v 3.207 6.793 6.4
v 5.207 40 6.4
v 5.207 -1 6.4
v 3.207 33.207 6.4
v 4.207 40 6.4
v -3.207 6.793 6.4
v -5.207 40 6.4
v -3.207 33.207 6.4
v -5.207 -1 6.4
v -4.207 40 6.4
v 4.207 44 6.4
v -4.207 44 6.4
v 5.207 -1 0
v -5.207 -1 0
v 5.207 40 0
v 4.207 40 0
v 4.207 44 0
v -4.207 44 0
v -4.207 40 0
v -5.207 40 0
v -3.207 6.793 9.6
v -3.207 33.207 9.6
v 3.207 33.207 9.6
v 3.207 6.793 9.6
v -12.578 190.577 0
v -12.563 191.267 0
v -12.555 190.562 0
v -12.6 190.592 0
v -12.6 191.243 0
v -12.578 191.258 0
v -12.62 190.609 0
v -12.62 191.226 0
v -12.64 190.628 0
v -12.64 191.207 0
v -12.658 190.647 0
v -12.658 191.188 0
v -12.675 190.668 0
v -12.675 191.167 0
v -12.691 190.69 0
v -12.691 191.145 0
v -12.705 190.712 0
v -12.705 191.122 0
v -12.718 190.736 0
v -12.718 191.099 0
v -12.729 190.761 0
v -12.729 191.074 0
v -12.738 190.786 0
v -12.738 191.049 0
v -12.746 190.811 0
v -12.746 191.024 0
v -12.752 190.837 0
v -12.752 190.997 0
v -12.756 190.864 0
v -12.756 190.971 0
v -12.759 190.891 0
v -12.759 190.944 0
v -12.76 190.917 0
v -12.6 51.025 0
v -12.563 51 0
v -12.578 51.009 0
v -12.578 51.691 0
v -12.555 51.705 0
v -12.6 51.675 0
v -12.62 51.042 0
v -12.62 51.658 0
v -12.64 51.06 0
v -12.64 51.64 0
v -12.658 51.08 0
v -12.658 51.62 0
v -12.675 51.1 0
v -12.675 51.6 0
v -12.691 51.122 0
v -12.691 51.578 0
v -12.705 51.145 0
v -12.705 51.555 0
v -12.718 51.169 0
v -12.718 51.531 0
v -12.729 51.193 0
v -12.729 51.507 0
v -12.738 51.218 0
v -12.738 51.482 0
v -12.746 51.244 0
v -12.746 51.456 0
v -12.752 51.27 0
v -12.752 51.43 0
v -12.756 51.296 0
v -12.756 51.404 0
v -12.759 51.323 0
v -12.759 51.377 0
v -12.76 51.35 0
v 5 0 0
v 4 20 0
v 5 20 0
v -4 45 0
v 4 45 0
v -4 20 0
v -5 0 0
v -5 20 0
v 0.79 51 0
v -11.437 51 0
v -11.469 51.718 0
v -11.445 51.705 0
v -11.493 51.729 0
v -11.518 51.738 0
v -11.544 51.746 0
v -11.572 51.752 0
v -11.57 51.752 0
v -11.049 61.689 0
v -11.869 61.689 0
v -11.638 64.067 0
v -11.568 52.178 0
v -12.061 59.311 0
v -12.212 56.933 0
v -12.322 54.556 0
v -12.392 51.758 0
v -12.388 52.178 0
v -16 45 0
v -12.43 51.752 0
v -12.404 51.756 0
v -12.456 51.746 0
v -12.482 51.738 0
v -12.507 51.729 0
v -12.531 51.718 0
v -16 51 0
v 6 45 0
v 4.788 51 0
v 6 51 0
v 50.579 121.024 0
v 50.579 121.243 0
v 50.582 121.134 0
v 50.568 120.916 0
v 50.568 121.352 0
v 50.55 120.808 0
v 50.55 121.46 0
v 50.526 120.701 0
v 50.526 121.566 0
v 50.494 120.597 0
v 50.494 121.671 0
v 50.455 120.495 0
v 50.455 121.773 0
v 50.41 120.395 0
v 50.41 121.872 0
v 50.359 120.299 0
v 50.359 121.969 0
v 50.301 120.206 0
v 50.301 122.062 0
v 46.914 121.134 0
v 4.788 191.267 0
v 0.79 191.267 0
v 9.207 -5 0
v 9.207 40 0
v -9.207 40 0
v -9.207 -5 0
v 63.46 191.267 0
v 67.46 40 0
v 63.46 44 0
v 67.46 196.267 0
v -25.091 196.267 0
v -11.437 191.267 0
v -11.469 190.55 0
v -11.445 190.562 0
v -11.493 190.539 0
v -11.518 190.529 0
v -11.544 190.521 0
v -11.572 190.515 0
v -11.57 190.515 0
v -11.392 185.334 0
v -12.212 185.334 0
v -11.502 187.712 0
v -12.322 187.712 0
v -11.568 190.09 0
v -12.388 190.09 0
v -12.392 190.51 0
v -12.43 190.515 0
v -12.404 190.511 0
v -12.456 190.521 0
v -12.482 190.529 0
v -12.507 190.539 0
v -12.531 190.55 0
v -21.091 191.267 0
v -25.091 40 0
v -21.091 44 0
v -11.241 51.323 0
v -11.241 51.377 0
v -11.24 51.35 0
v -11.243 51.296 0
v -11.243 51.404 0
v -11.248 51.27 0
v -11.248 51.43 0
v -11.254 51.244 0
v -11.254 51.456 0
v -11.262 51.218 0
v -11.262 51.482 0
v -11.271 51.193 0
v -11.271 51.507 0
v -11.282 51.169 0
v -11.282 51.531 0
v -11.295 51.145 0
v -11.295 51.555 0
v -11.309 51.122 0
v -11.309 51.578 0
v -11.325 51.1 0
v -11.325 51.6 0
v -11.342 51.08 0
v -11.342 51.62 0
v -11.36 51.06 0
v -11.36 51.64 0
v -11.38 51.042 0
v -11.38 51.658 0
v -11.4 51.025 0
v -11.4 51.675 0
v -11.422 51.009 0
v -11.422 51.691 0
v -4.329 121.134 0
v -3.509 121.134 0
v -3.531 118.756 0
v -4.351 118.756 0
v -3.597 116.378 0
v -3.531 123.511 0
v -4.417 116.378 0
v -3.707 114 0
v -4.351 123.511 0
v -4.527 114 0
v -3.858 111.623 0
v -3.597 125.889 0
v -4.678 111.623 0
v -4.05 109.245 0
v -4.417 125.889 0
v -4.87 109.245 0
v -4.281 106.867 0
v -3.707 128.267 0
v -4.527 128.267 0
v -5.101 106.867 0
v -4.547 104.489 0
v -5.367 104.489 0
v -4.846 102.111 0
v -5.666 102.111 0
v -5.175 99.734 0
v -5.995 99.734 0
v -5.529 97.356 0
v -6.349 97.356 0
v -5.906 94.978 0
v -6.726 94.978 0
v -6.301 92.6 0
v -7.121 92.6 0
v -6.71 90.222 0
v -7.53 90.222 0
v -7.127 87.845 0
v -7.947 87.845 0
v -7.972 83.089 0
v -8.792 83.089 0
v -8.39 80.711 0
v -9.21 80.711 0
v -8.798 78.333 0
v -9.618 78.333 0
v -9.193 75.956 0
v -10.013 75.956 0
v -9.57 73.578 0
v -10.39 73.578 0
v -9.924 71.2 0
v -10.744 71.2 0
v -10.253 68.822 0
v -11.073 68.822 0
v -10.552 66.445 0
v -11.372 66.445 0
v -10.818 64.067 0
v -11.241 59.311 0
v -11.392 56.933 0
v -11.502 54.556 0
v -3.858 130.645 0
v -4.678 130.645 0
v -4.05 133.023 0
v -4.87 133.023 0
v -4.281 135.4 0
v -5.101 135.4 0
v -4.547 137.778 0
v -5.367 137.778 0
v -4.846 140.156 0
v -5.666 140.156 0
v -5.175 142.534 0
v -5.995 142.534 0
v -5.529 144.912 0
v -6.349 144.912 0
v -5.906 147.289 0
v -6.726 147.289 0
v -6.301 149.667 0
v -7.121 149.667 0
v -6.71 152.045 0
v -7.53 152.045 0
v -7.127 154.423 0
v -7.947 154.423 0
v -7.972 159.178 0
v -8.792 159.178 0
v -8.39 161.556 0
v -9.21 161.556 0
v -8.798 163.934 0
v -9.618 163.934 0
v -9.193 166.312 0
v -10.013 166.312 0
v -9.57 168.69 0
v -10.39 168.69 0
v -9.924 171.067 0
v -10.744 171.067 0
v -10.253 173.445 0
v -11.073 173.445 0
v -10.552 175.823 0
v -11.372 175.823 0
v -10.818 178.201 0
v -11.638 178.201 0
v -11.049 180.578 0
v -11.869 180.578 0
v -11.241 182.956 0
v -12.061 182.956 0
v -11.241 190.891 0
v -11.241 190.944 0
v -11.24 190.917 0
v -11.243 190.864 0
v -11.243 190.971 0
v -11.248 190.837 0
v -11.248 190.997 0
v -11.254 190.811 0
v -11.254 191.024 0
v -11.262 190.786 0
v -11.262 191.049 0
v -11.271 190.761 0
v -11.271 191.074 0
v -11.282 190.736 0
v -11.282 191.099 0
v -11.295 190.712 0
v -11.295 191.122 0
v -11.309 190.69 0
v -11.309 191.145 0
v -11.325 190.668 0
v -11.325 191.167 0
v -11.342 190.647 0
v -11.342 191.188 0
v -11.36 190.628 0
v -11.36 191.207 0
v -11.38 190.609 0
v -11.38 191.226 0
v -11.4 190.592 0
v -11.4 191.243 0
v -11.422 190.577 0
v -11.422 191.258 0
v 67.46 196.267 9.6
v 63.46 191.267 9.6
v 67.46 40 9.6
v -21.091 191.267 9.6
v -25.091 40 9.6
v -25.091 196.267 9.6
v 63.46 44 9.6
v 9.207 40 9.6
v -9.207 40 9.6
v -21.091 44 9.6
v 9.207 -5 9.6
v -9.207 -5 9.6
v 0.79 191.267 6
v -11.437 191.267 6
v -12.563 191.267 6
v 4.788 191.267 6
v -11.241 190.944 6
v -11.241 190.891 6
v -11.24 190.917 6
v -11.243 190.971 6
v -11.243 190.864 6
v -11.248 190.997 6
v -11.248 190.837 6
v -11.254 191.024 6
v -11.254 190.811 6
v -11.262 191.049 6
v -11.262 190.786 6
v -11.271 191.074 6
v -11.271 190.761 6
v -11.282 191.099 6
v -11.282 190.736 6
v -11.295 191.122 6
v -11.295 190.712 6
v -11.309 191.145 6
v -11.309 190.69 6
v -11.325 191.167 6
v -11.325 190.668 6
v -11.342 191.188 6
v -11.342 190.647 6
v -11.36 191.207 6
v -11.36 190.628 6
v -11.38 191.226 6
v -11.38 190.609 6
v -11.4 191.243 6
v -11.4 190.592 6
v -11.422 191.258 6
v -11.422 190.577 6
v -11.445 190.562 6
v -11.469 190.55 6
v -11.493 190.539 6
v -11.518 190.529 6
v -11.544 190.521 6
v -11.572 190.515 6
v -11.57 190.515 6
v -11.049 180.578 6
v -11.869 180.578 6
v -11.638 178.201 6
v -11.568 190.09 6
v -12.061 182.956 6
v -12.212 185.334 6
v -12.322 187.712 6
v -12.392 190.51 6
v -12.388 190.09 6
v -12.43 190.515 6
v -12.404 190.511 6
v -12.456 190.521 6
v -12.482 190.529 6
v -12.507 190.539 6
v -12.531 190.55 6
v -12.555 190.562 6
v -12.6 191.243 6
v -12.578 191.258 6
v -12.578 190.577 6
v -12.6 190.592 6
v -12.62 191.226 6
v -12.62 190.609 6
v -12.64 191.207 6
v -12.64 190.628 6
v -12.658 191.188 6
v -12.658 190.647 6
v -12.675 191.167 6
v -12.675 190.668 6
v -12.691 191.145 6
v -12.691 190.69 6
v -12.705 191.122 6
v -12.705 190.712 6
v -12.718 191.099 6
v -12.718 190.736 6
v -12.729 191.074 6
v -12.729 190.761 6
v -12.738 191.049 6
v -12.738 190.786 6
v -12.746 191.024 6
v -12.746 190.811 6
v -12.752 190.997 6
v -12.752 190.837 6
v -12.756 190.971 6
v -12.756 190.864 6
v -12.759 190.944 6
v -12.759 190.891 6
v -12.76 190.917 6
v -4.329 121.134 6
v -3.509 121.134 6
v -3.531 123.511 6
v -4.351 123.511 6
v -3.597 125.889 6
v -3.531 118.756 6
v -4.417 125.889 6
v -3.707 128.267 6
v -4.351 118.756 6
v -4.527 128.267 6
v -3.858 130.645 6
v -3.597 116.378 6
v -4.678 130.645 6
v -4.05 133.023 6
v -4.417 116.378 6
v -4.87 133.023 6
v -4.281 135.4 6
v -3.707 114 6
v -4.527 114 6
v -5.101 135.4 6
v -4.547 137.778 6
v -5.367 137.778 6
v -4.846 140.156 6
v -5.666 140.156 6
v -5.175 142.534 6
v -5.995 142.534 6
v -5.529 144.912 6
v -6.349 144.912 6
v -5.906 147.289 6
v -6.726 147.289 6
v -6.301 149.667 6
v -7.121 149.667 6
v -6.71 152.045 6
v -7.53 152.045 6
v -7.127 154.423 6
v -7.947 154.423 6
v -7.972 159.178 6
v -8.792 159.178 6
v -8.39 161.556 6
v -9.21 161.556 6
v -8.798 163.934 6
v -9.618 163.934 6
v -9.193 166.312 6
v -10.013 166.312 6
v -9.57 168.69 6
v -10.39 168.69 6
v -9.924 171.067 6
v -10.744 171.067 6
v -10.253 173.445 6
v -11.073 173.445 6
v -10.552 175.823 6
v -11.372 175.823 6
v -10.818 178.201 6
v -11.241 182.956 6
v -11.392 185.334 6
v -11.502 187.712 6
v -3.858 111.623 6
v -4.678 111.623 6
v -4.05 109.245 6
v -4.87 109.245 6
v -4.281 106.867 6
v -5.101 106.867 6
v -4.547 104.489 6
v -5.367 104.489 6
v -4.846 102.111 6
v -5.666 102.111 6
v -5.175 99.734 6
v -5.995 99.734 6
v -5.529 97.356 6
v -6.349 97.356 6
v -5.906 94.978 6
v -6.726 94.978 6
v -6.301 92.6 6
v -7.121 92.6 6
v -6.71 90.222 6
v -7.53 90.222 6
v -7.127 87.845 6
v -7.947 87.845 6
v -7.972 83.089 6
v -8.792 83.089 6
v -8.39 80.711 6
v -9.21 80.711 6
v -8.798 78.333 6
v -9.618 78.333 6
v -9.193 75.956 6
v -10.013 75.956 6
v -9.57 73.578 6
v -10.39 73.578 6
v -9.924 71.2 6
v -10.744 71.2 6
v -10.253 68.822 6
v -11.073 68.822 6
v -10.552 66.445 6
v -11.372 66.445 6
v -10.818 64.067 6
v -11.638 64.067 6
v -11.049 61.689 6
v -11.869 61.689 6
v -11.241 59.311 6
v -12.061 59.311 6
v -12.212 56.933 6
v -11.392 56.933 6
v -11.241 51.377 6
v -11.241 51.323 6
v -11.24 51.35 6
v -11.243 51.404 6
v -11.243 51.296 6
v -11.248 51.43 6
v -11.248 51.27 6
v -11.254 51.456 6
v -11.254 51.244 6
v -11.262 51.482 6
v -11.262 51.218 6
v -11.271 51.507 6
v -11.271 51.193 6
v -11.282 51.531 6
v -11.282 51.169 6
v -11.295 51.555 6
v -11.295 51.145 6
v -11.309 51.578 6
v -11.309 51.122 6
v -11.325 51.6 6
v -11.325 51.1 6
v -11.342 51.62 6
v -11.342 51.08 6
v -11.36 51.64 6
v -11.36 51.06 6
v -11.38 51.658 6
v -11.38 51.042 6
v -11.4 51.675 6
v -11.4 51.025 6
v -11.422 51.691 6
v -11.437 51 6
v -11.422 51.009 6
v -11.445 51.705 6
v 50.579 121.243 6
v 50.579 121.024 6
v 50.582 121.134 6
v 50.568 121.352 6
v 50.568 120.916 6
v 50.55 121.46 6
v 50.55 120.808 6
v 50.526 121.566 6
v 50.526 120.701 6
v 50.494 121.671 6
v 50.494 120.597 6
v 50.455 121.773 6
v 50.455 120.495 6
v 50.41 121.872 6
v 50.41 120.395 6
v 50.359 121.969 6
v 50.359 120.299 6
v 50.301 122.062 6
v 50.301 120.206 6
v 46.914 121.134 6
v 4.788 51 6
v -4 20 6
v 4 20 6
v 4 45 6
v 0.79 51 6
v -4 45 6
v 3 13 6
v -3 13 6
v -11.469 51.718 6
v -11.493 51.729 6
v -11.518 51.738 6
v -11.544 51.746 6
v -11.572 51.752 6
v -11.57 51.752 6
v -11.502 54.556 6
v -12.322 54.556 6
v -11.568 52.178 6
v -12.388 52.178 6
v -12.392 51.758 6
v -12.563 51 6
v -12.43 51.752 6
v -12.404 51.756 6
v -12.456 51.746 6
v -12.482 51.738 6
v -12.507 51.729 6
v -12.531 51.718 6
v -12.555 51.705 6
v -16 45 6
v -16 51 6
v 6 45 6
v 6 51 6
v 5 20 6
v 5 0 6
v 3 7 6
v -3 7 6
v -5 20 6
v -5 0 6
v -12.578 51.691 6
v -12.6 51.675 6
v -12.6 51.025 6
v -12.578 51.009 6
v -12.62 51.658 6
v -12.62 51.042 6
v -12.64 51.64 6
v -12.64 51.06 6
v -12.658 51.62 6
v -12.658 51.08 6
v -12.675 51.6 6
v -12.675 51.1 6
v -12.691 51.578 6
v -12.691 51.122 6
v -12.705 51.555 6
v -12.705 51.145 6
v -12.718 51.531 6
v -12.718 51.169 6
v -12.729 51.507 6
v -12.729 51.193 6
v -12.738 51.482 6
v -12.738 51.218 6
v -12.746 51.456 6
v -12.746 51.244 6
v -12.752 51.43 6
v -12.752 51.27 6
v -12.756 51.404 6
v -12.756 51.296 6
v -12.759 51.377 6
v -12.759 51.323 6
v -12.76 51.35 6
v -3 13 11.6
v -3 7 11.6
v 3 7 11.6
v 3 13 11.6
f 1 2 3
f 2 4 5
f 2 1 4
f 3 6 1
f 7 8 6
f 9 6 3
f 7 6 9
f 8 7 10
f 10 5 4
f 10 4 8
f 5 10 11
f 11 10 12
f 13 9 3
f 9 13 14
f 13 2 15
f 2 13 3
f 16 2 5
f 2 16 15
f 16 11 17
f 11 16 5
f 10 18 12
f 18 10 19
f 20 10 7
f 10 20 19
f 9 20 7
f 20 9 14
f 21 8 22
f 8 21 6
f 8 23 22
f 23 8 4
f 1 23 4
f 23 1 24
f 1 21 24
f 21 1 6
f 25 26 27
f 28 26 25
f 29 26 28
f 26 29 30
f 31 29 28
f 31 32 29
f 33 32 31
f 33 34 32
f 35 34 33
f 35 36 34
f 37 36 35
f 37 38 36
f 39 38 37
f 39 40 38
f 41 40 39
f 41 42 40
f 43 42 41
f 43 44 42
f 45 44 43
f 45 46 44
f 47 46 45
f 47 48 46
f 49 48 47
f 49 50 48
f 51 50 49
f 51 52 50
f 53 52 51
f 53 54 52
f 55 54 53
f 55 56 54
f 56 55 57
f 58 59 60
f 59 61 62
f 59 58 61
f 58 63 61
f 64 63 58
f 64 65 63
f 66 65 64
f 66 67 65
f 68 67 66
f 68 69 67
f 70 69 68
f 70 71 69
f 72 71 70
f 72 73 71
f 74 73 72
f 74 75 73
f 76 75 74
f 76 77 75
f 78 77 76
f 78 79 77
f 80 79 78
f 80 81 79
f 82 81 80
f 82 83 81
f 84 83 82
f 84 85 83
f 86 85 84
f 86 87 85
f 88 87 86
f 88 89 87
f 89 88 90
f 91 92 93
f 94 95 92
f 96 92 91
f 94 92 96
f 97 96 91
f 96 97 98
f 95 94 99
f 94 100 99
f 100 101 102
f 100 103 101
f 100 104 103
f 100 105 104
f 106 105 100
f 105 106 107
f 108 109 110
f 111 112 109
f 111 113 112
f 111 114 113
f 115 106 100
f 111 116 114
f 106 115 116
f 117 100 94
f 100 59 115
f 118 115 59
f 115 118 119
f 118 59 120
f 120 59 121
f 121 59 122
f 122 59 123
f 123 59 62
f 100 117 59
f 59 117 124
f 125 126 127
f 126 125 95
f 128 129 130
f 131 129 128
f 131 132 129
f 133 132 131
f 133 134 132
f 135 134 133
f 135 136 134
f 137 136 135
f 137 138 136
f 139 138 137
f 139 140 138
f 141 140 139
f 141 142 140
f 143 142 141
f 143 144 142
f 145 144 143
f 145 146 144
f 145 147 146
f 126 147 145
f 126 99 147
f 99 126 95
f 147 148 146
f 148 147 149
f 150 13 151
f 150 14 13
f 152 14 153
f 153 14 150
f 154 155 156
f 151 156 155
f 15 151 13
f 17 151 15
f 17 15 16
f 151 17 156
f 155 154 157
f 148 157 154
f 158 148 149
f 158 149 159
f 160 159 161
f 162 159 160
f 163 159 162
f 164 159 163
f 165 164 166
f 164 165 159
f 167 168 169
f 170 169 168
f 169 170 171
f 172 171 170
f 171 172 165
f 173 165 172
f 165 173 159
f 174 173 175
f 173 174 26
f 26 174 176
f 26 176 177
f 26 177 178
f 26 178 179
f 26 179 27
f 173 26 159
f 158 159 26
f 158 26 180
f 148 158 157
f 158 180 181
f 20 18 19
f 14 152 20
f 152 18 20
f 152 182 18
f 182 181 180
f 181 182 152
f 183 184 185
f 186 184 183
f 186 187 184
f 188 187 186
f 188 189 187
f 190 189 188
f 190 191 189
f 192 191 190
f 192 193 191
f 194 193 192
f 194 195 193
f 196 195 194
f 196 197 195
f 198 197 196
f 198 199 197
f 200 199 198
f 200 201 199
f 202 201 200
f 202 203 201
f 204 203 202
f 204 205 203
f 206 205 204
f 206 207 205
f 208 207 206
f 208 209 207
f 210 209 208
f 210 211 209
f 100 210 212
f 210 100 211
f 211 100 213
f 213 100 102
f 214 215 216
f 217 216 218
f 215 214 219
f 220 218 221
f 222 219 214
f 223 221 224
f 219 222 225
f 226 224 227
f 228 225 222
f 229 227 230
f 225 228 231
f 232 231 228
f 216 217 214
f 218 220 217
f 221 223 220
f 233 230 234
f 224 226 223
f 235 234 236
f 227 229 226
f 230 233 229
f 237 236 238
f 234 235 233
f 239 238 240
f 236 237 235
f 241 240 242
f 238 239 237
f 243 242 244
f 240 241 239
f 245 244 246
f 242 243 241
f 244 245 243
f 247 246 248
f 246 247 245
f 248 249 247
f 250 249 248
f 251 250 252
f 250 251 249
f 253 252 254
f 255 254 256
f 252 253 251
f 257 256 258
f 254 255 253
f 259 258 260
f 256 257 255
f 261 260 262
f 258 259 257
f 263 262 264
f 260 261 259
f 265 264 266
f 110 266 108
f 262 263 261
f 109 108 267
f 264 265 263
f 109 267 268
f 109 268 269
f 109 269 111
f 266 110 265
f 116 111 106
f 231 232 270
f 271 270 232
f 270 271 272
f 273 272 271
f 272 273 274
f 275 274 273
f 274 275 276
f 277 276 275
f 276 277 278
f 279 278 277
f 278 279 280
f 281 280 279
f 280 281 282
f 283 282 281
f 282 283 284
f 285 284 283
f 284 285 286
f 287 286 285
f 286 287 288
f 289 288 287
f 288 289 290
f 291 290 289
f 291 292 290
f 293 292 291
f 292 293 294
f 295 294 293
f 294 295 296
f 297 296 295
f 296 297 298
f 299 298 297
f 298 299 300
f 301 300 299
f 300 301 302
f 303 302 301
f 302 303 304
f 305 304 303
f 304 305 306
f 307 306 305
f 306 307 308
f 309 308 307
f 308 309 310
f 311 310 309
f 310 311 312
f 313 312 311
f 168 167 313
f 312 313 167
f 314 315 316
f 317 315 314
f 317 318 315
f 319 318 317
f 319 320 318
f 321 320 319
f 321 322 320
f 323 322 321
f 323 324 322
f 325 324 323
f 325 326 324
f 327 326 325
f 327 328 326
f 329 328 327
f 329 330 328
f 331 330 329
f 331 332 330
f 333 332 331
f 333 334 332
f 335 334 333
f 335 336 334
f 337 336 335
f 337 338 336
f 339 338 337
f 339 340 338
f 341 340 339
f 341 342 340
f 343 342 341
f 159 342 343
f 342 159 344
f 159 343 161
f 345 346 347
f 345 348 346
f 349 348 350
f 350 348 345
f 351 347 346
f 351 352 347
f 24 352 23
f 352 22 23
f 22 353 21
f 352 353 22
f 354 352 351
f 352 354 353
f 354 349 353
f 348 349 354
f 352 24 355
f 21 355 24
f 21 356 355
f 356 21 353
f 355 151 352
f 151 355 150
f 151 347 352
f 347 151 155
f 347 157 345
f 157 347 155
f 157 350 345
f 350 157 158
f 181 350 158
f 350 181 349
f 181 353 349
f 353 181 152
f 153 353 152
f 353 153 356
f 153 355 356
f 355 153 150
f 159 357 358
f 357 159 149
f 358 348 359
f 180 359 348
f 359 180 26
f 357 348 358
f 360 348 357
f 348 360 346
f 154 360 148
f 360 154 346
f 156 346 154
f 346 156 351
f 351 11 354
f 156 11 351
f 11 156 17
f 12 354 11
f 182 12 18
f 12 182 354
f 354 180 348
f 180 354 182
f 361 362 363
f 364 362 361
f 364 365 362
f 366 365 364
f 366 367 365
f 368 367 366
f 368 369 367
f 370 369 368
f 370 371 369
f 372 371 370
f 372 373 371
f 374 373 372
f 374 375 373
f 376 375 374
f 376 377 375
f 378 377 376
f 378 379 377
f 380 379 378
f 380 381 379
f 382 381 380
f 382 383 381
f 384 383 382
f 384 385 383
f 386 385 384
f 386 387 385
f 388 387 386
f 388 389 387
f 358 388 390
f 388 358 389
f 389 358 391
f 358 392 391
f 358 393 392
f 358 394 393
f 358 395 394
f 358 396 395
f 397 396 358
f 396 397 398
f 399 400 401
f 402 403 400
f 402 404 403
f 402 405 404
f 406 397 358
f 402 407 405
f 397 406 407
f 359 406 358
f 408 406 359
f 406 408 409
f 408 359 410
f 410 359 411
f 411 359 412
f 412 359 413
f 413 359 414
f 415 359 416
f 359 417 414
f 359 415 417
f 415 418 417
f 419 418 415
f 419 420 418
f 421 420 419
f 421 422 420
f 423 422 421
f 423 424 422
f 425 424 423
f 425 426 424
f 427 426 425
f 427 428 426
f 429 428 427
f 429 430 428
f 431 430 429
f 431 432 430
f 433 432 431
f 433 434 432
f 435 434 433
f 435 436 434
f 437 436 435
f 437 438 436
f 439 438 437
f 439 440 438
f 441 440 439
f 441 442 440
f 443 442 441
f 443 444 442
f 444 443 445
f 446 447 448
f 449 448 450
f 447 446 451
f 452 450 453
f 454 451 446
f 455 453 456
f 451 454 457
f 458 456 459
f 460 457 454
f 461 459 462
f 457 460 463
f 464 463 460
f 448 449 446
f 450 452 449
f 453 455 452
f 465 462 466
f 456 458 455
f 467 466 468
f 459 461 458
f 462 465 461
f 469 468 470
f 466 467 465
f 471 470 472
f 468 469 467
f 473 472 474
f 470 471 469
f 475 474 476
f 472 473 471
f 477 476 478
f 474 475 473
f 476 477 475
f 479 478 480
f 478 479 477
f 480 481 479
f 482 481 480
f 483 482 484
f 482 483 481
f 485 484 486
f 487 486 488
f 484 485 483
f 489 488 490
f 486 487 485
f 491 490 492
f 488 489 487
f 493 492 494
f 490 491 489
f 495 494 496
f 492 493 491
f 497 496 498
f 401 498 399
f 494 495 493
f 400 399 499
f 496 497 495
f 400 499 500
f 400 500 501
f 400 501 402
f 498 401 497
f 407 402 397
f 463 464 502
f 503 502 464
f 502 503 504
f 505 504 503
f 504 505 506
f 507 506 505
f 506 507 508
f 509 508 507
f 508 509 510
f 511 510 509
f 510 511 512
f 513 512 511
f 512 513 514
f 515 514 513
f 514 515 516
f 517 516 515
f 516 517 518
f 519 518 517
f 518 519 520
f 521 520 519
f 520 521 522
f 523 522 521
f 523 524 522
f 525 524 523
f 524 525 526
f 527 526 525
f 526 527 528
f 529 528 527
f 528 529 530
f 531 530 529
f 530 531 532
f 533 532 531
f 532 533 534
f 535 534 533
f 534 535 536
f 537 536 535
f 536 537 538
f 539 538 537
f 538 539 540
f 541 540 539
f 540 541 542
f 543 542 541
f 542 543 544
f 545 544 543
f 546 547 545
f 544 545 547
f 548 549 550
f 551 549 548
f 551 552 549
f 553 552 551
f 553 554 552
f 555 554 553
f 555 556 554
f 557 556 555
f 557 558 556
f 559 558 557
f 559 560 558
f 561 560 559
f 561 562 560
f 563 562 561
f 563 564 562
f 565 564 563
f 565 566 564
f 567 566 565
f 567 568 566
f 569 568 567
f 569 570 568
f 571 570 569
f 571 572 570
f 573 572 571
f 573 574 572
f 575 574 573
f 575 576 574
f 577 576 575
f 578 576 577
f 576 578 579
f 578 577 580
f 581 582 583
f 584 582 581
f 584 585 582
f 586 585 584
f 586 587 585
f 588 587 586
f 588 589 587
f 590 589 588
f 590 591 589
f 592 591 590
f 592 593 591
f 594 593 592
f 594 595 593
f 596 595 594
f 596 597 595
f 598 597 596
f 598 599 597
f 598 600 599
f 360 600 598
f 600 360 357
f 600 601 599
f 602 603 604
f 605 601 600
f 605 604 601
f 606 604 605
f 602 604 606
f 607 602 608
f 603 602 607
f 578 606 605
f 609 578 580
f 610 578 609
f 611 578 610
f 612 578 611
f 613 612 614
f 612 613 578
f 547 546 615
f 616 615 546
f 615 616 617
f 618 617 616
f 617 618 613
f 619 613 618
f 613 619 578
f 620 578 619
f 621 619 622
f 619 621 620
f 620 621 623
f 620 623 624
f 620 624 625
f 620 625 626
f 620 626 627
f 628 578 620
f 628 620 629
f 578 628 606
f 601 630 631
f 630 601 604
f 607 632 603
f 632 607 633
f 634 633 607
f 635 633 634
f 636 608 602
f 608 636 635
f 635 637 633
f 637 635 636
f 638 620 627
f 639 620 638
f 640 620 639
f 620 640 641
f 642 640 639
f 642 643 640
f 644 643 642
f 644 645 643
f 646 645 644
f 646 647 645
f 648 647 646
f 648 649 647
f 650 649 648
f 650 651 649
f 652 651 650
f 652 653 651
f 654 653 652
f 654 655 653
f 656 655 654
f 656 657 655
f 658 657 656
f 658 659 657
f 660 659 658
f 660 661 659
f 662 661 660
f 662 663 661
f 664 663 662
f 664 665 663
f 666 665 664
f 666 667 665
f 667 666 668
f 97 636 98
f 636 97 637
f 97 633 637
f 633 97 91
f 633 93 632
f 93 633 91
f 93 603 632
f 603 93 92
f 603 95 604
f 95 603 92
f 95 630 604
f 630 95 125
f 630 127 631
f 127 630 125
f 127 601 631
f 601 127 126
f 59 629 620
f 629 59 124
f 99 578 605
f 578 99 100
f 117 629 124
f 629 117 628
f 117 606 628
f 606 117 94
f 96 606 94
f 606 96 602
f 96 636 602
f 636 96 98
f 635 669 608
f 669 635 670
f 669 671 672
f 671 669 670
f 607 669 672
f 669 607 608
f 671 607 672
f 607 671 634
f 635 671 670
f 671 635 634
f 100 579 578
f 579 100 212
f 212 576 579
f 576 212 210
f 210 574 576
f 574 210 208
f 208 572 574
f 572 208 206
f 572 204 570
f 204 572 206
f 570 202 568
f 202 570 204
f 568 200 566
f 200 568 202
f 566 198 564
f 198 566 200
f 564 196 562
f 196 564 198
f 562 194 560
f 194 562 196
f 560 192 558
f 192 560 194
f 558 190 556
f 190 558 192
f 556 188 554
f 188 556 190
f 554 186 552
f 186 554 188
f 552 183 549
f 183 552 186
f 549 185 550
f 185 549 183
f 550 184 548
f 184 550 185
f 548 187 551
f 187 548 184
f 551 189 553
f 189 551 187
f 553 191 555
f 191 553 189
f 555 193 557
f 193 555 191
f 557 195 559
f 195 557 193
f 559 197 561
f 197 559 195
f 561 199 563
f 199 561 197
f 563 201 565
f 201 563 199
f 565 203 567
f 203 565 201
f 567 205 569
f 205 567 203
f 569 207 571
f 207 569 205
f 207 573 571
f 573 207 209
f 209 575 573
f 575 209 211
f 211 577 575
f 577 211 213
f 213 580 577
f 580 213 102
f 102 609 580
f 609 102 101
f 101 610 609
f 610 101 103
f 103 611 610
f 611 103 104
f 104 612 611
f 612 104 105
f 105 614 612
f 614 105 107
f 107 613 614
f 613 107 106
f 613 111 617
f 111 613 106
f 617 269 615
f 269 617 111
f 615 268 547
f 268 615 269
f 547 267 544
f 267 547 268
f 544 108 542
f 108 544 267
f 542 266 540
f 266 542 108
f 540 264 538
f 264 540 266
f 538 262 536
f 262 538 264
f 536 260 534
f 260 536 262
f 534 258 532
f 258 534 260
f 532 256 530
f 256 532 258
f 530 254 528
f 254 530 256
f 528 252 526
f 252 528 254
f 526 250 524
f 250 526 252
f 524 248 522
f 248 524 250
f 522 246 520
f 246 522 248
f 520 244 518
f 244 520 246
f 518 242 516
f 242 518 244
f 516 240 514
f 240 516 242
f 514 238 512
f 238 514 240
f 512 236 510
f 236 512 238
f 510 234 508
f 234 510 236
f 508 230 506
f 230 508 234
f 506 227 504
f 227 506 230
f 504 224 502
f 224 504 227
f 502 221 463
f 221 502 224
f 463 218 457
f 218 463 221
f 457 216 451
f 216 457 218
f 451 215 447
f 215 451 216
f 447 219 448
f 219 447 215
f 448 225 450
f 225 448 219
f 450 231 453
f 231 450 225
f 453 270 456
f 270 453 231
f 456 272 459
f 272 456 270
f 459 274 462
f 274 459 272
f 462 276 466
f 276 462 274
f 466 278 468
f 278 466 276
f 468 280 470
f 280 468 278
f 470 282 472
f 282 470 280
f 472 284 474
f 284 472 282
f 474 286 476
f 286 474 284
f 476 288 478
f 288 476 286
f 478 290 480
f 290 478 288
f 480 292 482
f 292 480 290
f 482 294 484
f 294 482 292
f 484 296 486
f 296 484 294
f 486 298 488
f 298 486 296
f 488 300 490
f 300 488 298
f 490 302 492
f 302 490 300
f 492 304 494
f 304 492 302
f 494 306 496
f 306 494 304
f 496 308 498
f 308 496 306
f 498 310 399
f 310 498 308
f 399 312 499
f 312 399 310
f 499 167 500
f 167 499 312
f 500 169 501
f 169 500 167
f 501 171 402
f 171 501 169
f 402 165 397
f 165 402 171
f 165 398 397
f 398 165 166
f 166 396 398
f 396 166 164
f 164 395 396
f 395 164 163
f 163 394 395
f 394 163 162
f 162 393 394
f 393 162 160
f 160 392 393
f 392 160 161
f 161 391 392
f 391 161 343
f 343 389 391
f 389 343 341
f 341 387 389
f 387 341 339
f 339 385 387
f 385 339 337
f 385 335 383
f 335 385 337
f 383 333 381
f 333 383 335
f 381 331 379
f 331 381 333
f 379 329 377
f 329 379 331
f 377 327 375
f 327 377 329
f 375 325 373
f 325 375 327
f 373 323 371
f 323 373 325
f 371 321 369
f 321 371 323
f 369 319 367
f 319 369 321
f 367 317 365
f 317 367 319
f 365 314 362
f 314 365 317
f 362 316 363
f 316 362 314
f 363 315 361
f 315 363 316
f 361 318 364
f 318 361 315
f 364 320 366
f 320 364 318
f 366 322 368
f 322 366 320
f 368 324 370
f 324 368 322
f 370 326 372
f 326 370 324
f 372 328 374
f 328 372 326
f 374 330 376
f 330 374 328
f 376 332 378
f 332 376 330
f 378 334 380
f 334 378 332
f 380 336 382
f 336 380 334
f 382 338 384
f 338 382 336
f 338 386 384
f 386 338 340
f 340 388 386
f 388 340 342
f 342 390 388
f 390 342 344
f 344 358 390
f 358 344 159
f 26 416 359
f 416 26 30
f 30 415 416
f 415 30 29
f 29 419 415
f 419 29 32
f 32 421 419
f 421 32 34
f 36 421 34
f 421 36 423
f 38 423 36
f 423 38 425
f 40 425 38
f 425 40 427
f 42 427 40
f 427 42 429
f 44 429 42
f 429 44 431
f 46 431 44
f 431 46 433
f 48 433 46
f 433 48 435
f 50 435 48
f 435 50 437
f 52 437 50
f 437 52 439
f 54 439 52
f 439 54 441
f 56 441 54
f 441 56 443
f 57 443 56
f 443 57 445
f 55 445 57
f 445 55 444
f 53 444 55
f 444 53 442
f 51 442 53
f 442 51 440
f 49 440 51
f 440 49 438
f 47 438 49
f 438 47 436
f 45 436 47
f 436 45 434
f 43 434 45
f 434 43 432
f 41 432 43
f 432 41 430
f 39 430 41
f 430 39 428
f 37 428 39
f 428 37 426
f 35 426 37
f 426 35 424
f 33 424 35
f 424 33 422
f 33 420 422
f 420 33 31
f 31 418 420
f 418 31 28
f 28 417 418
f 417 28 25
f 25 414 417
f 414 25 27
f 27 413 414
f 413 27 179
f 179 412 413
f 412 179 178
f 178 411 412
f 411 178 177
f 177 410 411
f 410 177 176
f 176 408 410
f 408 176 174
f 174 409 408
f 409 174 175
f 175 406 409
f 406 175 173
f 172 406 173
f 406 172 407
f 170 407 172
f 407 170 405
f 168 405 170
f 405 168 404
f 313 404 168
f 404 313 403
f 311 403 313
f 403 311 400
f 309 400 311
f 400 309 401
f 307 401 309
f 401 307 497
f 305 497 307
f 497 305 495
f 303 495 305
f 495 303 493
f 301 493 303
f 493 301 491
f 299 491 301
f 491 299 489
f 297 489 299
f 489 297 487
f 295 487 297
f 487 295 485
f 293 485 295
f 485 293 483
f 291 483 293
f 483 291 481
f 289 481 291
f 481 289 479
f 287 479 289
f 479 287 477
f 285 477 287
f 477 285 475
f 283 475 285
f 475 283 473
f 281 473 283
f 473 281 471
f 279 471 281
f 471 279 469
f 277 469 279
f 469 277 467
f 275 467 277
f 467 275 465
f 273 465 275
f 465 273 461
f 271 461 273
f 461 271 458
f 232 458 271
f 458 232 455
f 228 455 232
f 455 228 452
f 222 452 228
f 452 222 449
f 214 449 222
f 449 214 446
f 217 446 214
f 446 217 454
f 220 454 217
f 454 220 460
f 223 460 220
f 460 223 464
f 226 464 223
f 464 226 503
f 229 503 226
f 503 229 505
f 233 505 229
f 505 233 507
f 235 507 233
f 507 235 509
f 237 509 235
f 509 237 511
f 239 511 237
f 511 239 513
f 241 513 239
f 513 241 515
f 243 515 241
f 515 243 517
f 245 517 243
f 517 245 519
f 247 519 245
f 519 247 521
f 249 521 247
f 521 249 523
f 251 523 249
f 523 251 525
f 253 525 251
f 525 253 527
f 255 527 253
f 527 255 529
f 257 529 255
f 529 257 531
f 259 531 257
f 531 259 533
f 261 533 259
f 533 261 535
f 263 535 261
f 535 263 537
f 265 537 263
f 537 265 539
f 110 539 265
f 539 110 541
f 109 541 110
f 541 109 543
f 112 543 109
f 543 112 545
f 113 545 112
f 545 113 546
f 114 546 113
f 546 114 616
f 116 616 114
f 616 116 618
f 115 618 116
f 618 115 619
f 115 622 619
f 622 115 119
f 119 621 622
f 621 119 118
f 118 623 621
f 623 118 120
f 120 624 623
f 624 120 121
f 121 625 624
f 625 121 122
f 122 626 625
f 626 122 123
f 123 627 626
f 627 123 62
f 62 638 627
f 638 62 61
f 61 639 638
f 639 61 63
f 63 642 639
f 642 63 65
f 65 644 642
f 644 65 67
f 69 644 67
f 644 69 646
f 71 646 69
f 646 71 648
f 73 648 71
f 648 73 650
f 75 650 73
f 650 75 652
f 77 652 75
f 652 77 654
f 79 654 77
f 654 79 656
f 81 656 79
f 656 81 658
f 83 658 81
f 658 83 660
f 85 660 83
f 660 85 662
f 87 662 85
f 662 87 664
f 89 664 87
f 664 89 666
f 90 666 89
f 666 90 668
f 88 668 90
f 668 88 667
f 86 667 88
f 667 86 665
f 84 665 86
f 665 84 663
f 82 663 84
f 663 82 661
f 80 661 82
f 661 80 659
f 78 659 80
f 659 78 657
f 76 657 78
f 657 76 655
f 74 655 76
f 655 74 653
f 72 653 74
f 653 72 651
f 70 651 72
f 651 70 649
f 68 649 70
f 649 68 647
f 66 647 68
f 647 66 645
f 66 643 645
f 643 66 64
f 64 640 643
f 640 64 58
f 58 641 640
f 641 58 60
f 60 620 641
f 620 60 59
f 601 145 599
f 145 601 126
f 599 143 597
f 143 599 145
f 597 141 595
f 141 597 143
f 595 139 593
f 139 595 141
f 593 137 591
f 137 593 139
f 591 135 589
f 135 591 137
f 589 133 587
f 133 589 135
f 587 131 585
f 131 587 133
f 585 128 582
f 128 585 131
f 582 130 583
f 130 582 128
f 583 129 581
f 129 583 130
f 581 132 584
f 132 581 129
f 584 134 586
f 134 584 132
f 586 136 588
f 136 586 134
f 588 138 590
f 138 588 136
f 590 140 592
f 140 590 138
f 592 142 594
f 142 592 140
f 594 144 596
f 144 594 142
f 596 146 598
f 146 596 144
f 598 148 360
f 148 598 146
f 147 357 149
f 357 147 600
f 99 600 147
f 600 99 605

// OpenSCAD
// czs-slider — a print-in-place captive slider whose resistive force is
// near-constant across its stroke: a quasi-zero-stiffness (QZS) mechanism.
// Reference design for docs/advanced-techniques.md Domain 1 (bistable &
// constant-force) fused with Domain 3 (print-in-place kinematics), per brief
// #393 (child of the reference-design catalog #204, Tier 3 "advanced").
//
// THE MECHANISM (D1+D3 fusion, both elements between the same two rigid
// bodies — the slider and the frame — i.e. genuinely in parallel):
//   NEGATIVE stiffness — a fixed-fixed pre-buckled ARCH, chord along the
//     stroke axis, rise transverse. Advancing the slider shortens the chord
//     and drives the arch through its snap: over the snap its force FALLS,
//     which is negative slope. Dimensioned by the same two nondimensional
//     constants as designs/bistable-toggle (#389, the landed solve):
//       switch force   f_s * l^3 / (E*I*h) = 1486.57      (I = w*t^3/12)
//       travel         u_tr / h            = 1.98
//   POSITIVE stiffness — a V-BEAM (chevron) spanning the same two anchors,
//     apex offset transverse. Shortening its span bends its legs: positive
//     slope, k_v = E*w*t_v^3*sin^2(theta)/L^3 to first order (theta = the
//     leg's angle off the stroke axis; a stated model, not an exactness).
//   The slopes cancel over the working range => net stiffness ~ 0 => the
//   slider glides at ~constant force instead of fighting a rising spring.
//
// THE SOLVE (from the brief's targets, not by feel — every number below is
// derived; NOTES.md "The solve" records the chain and the predicted curve):
//   stroke 20 mm, flat zone = middle 70% = u in [3, 17] (14 mm)
//   arch snap travel  u_tr = 16 mm        -> h = u_tr/1.98 = 8.081 mm
//   arch thickness    t    = 0.82 mm      (bistability h/t >= 2.3 caps t at
//                                          3.51; 0.82 = the #389 production
//                                          thickness, proven against the 0.8
//                                          thin-wall floor on a curved band)
//   arch width        w    = 6 mm         (the #389 floor w >= 3, taken at
//                                          the same value as that solve)
//   arch switch force f_s  = 2.4 N        (chosen small so the slope match
//                                          is tolerant — NOTES.md ripple para)
//     -> span l = cbrt(1486.57*E*I*h/f_s) = 140.26 mm   (l/h = 17.4, shallow)
//   arch mean slope   k_a  = -2*f_s/u_tr  = -0.30 N/mm  (linear idealization:
//     the force falls from +f_s to -f_s between the limit points, the
//     zero-net-energy signature of a symmetric bistable)
//   V-beam sized so k_v straddles k_a across the flat zone: apex offset 50 mm
//     at the relaxed pose, t_v = 3.34 mm, sized by k_v(3)+k_v(17) = 2*|k_a| —
//     matched at the flat-zone ENDS so the chevron's geometric stiffening
//     straddles the target instead of drifting past it (k_v(10) = 0.301 vs
//     |k_a| = 0.300). A mid-stroke-only match leaves the second half of the
//     plateau rising ~+70% of target slope; NOTES.md shows both curves.
//   working point: the V-beam's relaxed geometry sits at u_free = 4.33 mm,
//     which sets the plateau level to the brief's ~2 N:
//     F_flat = f_s + k_v*(u_a - u_free) ~= 2.0 N
//   Predicted curve (linearized two-element model, u = 3..17 mm):
//     2.06 1.97 1.92 1.90 1.89 1.90 1.93 1.99 2.07 N — mean 1.97 N, ripple
//     +-5% on the model. No digital gate can measure force: the coupon finds
//     the real plateau, a FIELD-TEST entry verifies it (NOTES.md).
//
// THE SLIDE (D3, per designs/captive-spinner #387 — clearances derived from
// process constants, and xy and z are DIFFERENT numbers because different
// processes limit them):
//   radial/xy gap (slider flanks vs channel walls — vertical wall-to-wall,
//     spread-limited):      k_xy * line_w = 0.45 * (1.15*0.4) = 0.207 mm
//   axial/z gap  (slider top vs the capture deck — a roof over a moving
//     part, sag-limited):   z_layers * layer_h = 2 * 0.2 = 0.4 mm, whole
//     layers so the gap's floor and roof land on layer boundaries
// The slider rides ON the bed (its underside is first layers — no gap below
// to weld) and is trapped in Z by the deck, in X by the channel walls, in Y
// by the two body stops — the back wall standing stop_clear = 1 mm behind
// the rest face, so in the PRINTED POSE nothing touches but the designed
// spring welds (a zero-gap stop face prints as a seam and welds shut). The
// knob pokes up through a slot in the deck (same
// xy gap) — that is the push/pull affordance; both slot ends sit exactly one
// xy gap beyond the travel, so they can only ever act as Y-capture backups,
// never as the working stops (the #389 stem_clear ordering).
//
// HARD STOPS (the doc's fatigue rule: the real limit is off-axis overload,
// not primary-DOF motion): -Y the back wall's face; +Y the slider shoulder
// vs the stop bar (windowed for the tongue — its jambs are the stop face);
// +-X the channel walls in the slot and, in the chamber, the chamber walls
// placed sweep_clear = 0.6 mm beyond the arch's full snap sweep (band
// mirrored through the chord) and the V-beam's fullest apex; +Z the deck.
// The `fitcheck` part proves the cage clears EVERYTHING that moves across
// the full stroke and the full snap; `fitcheck_neg` proves it can fail.
//
// PRINT FLAT. The profile is in XY, extruded in Z; the arch and the V-beam
// legs are vertical bands standing on the bed along their whole curve, so
// every flexure bends in the layer plane — the #1 flexure rule. No supports;
// the one bridge is the capture deck over the 10.4 mm channel (sag into the
// 0.4 mm roof gap is the budget the z-gap derivation already charges for;
// the coupon's fit cells verify it on your printer). All dims in mm.
// Bed: ~201 x 93 mm — needs a 220 mm class bed (NOTES.md "Bed").

/* [Targets — the geometry solves from these] */
// Plateau force across the flat zone (N) — the brief's "~2 N, feelable"
target_force = 2.0;
// Stroke (mm) — full travel of the slider
stroke = 20;
// Fraction of the stroke the plateau must span (middle of the travel)
flat_frac = 0.70;
// Young's modulus (MPa). PETG ~= 2000 — the datum the force solve uses; the
// echoed forces are predictions to verify with the coupon, not guarantees.
E = 2000;

/* [Arch — the negative-stiffness element, per the #389 solve] */
// Snap travel u_tr (mm) — derived: covers the flat zone with 1 mm shoulders
u_tr = stroke * flat_frac + 2;             // 16
// Mid-rise h (mm) — derived: u_tr / 1.98
mid_rise = u_tr / 1.98;                    // 8.081
// Band thickness t (mm) — see header; 0.82 clears the 0.8 floor on curves
beam_t = 0.82;
// Out-of-plane width w (mm) = slider height in Z (both flexures, one band)
width = 6;
// Switch force f_s (N) — chosen small so the slope match is tolerant
target_fs = 2.4;
// Clamped span l (mm) — derived from target_fs: cbrt(1486.57*E*I*h/f_s)
span = pow(1486.57 * E * (width * pow(beam_t, 3) / 12) * mid_rise / target_fs, 1 / 3);
// Arch centreline X (mm) — the line the chord runs on, left of centre
x_arch = -12;
// Where the snap starts (mm into the stroke) — derived: flat-zone start
u_engage = (1 - flat_frac) / 2 * stroke;   // 3

/* [V-beam — the positive-stiffness element] */
// Anchor line X (mm) — right of centre, clear of the arch's sweep
x_vbeam = 2;
// Apex offset at the relaxed pose (mm) — steep enough that the chevron's
// geometric stiffening stays gentle across the stroke (NOTES.md ripple para)
v_apex0 = 50;
// Leg thickness (mm) — slope-matched at the flat-zone ends (see header)
v_t = 3.34;

/* [Slide — process constants per #387, split xy from z] */
// Nozzle diameter (mm)
nozzle_d = 0.4;
// Extruded line width (mm)
line_w = 1.15 * nozzle_d;
// Spread factor on the xy gap — THE tuning knob (coupon sweeps it)
k_xy = 0.45;
// Whole layers of roof gap (integer; sag budget for the capture deck)
z_layers = 2;
// Layer height (mm)
layer_h = 0.2;

/* [Slider & frame] */
// Slider body half-width (mm) — sets the channel; 10 mm keeps the deck's
// bridge at 10.4 mm (routine for a slicer, gentle on the 0.4 roof gap)
slider_hw = 5;
// Slider body length (mm) — equal to the stroke so both stops are body stops
slider_len = stroke;
// Tongue width (mm) — the narrow stem through the stop-bar window
tongue_w = 8;
// Tongue+head length (mm) from the body's +Y end to the head's +Y face;
// head clears the stop bar by 1 mm at u = 0
tongue_len = 31;
// Head (flexure anchor plate) X extent [min, max] (mm) — spans arch..V lines
head_x = [x_arch - 4, x_vbeam + 4];
// Head length in Y (mm)
head_len = 6;
// Knob half-width X (mm) — the push/pull affordance through the deck slot
knob_hw = 3;
// Knob proud height above the deck top (mm)
knob_proud = 2;
// Channel wall thickness (mm)
wall_t = 4;
// Clearance from the springs' full sweep to the chamber walls (mm)
sweep_clear = 0.6;
// Beam-anchor overlap into the frame/head solids (mm) — unions stay solid
ov = 1.2;
// Printed-pose clearance at the -Y stop (mm): the back wall stands this far
// behind the slider's rest face so NOTHING touches in the printed pose but
// the designed spring welds — a zero-gap stop face prints as a seam that
// welds shut (what iteration 1's fusecheck caught, on the part and on every
// coupon fit cell). Buys the same amount of protective -Y overtravel before
// the arch band goes into tension.
stop_clear = 1;
// Preview pose: slider displacement into the stroke, 0..stroke (mm).
// PRINT AT 0 — the as-solved rest pose.
demo_u = 0;

/* [Quality] */
// Production value 96; the arch band's curve resolution is NS below,
// independent of $fn.
$fn = 96;

// ---- derived ----------------------------------------------------------------
xy_tol = k_xy * line_w;                    // 0.207 — spread-limited
z_gap = z_layers * layer_h;                // 0.4 — sag-limited, whole layers
sh_h = width;                              // slider height = flexure band
deck_z0 = sh_h + z_gap;                    // 6.4 — roof gap above the slider
deck_t = 3.2;                              // capture deck thickness
frame_h = deck_z0 + deck_t;                // 9.6 — walls/deck top
knob_h = frame_h + knob_proud;             // 11.6 — knob top
NS = 60;                                   // arch band polygon resolution

fs_pred = 1486.57 * E * (width * pow(beam_t, 3) / 12) * mid_rise / pow(span, 3);
k_arch = 2 * target_fs / u_tr;             // |negative slope|, N/mm

// V-beam: leg length fixed by the relaxed pose (apex offset v_apex0 there);
// like the arch it is printed deflected — the pre-load IS its working point.
u_free = u_engage + (target_fs - target_force) / k_arch;   // 4.333
v_span0 = span - u_free;                   // 135.93 — relaxed span
v_L = pow(pow(v_span0 / 2, 2) + pow(v_apex0, 2), 0.5);     // 84.37
function v_half(s) = (span - s) / 2;                       // half-span at pose s
function v_apex(s) = pow(max(v_L * v_L - pow(v_half(s), 2), 0.01), 0.5);
function v_k(s) = E * width * pow(v_t, 3) * pow(v_apex(s) / v_L, 2) / pow(v_L, 3);

// Y coordinates of the frame (slider pose s: body tail at y = s)
y_slot0 = 0;                               // slider rest face (body tail at u=0)
y_chan0 = y_slot0 - stop_clear;            // channel -Y end / back wall face
y_slot1 = slider_len + stroke;             // 40 — stop bar face (+Y body stop)
y_bar_t = 4;                               // back wall / stop bar thickness
tip0 = slider_len + tongue_len;            // 51 — head +Y face at pose 0
y_far = tip0 + span;                       // 191.26 — far bar -Y face
y_far_t = 5;                               // far bar thickness

// sweep extremes (chamber walls and the fitcheck)
arch_sweep_hw = mid_rise + beam_t / 2;     // 8.49 — band's max |x - x_arch|
v_apex_max = x_vbeam + v_apex(stroke) + v_t / 2;
chamber_x = [x_arch - arch_sweep_hw - sweep_clear - wall_t, x_arch - arch_sweep_hw - sweep_clear];
chamber_x2 = [v_apex_max + sweep_clear, v_apex_max + sweep_clear + wall_t];
frame_x = [chamber_x[0], chamber_x2[1]];   // frame outer X extent

// ---- the mover (slider + tongue + head + knob), pose s ----------------------
function tip_y(s) = s + slider_len + tongue_len;   // head +Y face at pose s

// the mover's three features, split so the sweep can hull each one across
// the stroke (see sweep_2d)
module body_2d(s) {
    // body (guided + captured)
    translate([-slider_hw, s]) square([2 * slider_hw, slider_len]);
}
module tongue_2d(s) {
    // tongue through the stop-bar window
    translate([-tongue_w / 2, s + slider_len]) square([tongue_w, tongue_len - head_len]);
}
module head_2d(s) {
    // head: the rigid plate both flexures anchor into
    translate([head_x[0], tip_y(s) - head_len]) square([head_x[1] - head_x[0], head_len]);
}

module slider_2d(s) {
    union() { body_2d(s); tongue_2d(s); head_2d(s); }
}

module knob_2d(s) {
    // centred on the body; both slot ends sit one xy gap beyond the travel
    translate([-knob_hw, s + slider_len / 2 - knob_hw]) square([2 * knob_hw, 2 * knob_hw]);
}

module mover(s) {
    linear_extrude(sh_h) slider_2d(s);
    linear_extrude(knob_h) knob_2d(s);     // prints on the body, through the slot
}

// ---- the flexures, pose s ----------------------------------------------------
// clamped first-mode band; rise in +x from the chord line x_a (h < 0 mirrors)
function arch_rise_at(dy, chord, h) = h * (1 - cos(360 * dy / chord)) / 2;

module arch_band_2d(x_a, y0, y1, h, t) {
    chord = y1 - y0;
    top = [for (i = [0 : NS]) let (dy = chord * i / NS)
        [x_a + arch_rise_at(dy, chord, h) + t / 2, y0 + dy]];
    bot = [for (i = [NS : -1 : 0]) let (dy = chord * i / NS)
        [x_a + arch_rise_at(dy, chord, h) - t / 2, y0 + dy]];
    polygon(concat(top, bot));
}

module arch_root_gussets_2d(x_a, y0, y1, t) {
    // r = 0.5t root fillets (the doc's minimum), each disc `bite` PAST the
    // faces it joins — a tangent-only disc pinches the polygon at a point and
    // exports naked edges (the #389 coupon lesson). Both sides of both roots:
    // the band sweeps to -h, so the concave side flips after the snap.
    rf = t / 2;
    bite = 0.06;
    for (ry = [y0, y1], sy = [-1, 1], sx = [-1, 1])
        translate([x_a + sx * (rf - bite), ry + sy * (rf - bite)]) circle(rf);
}

module arch(s) {
    linear_extrude(sh_h)
        union() {
            arch_band_2d(x_arch, tip_y(s) - ov, y_far + ov, mid_rise, beam_t);
            arch_root_gussets_2d(x_arch, tip_y(s), y_far, beam_t);
        }
}

module vbeam(s) {
    // two hull-beams through the apex; the rounded apex doubles as the joint
    // fillet. Overlaps both anchors by ov (solid unions, no kissing edges).
    ap = [x_vbeam + v_apex(s), (tip_y(s) + y_far) / 2];
    linear_extrude(sh_h) union() {
        hull() { translate([x_vbeam, tip_y(s) - ov]) circle(v_t / 2); translate(ap) circle(v_t / 2); }
        hull() { translate(ap) circle(v_t / 2); translate([x_vbeam, y_far + ov]) circle(v_t / 2); }
    }
}

// ---- the cage (frame) --------------------------------------------------------
// deck = false omits the capture deck's footprint: that is the fitcheck's
// cage, compared against the movers' z <= deck_z0 sweep only, so the deck
// (a z > deck_z0 solid sharing the channel's footprint) must not read as an
// obstacle it is not.
module frame_2d(deck = true) {
    ch = slider_hw + xy_tol;               // channel half-width (the xy gap)
    fw = ch + wall_t;                      // frame half-width at the slot zone
    union() {
        // back wall (-Y overload stop, stop_clear behind the rest face) +
        // channel side walls + the capture deck
        translate([-fw, y_chan0 - y_bar_t]) square([2 * fw, y_bar_t]);
        translate([-fw, y_chan0]) square([wall_t, y_slot1 - y_chan0]);
        translate([ch, y_chan0]) square([wall_t, y_slot1 - y_chan0]);
        if (deck)
            translate([-ch, y_chan0]) square([2 * ch, y_slot1 - y_chan0]);
        // stop bar (+Y body stop, full chamber width — ties the walls)
        translate([frame_x[0], y_slot1]) square([frame_x[1] - frame_x[0], y_bar_t]);
        // chamber side walls (the springs' +-X overload stops)
        translate([chamber_x[0], y_slot1 + y_bar_t])
            square([wall_t, y_far + y_far_t - y_slot1 - y_bar_t]);
        translate([chamber_x2[0], y_slot1 + y_bar_t])
            square([wall_t, y_far + y_far_t - y_slot1 - y_bar_t]);
        // far bar (the flexures' fixed anchor)
        translate([frame_x[0], y_far]) square([frame_x[1] - frame_x[0], y_far_t]);
    }
}

// The below-deck cuts in 2D: the channel (from stop_clear behind the rest
// face to the stop bar) and the tongue window through the stop bar. Shared
// by frame_cuts_3d (the real part) and the fitcheck's cage, so the cage
// proves what the real frame actually is — a cage without the cuts would
// read the tongue's own window as an obstacle (iteration 1's finding).
module below_deck_cuts_2d(gap) {
    ch = slider_hw + gap;
    // channel: slider body
    translate([-ch, y_chan0]) square([2 * ch, y_slot1 - y_chan0]);
    // tongue window through the stop bar
    translate([-tongue_w / 2 - gap, y_slot1])
        square([tongue_w + 2 * gap, y_bar_t + 0.1]);
}

// z-banded cuts: the below-deck set under the deck, then the knob slot
// through the deck's own band. fused = true turns every clearance into
// 0.2 mm of interference — the fusecheck's known-fused control.
module frame_cuts_3d(fused = false) {
    gap = fused ? -0.2 : xy_tol;
    kh = knob_hw + gap;
    translate([0, 0, -0.1]) linear_extrude(deck_z0 + 0.1) below_deck_cuts_2d(gap);
    // knob slot through the deck: the knob's travel + one gap each end
    translate([0, 0, deck_z0]) linear_extrude(knob_h - deck_z0 + 0.1)
        translate([-kh, slider_len / 2 - knob_hw - gap])
            square([2 * kh, stroke + 2 * knob_hw + 2 * gap]);
}

module frame(fused = false) {
    difference() {
        linear_extrude(frame_h) frame_2d();
        frame_cuts_3d(fused);
    }
}

// ---- everything that moves, swept over the full stroke and the full snap ----
// PER-FEATURE hulls: every mover feature translates monotonically in +Y, so
// the hull of its two extreme poses IS its swept volume. Hulling the whole
// mover instead bridges body->head diagonally through the channel walls and
// reports phantom interference on walls no real pose touches (iteration 1's
// finding). The arch hulls its four extreme poses (+/- rise at both stroke
// ends); each V leg hulls its four endpoint circles, the far anchor pulled
// v_t/2 back of the far bar — the real leg overlaps the bar by `ov` as its
// designed weld, which is not the sweep's business.
module sweep_2d() {
    hull() { body_2d(0); body_2d(stroke); }
    hull() { tongue_2d(0); tongue_2d(stroke); }
    hull() { head_2d(0); head_2d(stroke); }
    hull() { knob_2d(0); knob_2d(stroke); }
    hull() {
        arch_band_2d(x_arch, tip_y(0), y_far, mid_rise, beam_t);
        arch_band_2d(x_arch, tip_y(0), y_far, -mid_rise, beam_t);
        arch_band_2d(x_arch, tip_y(stroke), y_far, mid_rise, beam_t);
        arch_band_2d(x_arch, tip_y(stroke), y_far, -mid_rise, beam_t);
    }
    y_a = y_far - v_t / 2 - 0.05;            // far anchor clear of the bar
    for (leg = [0, 1]) hull()
        for (s = [0, stroke]) {
            ap = [x_vbeam + v_apex(s), (tip_y(s) + y_far) / 2];
            translate(leg == 0 ? [x_vbeam, tip_y(s)] : [x_vbeam, y_a]) circle(v_t / 2);
            translate(ap) circle(v_t / 2);
        }
}

// ---- the coupon: 3 fit cells (k_xy sweep) + 1 QZS feeler cell ----------------
// Fit cells: the production channel section with free sliders at k_xy =
// 0.40 / 0.45 (production) / 0.50, labelled 1/2/3 (no "0" glyphs — an
// enclosed counter cuts loose as a floating chip). Feeler: a shorter-span QZS
// pair (same t, h, w, channel section; l/h = 11.1) whose plateau is firmer
// but teaches the same glide — and which way to tune when your E is off the
// datum. Printed at rest like the production part.
fit_cell_len = 26;
fit_kxy = [0.40, 0.45, 0.50];

module fit_cell(k, label) {
    ch = slider_hw + k * line_w;
    fw = ch + wall_t;
    difference() {
        linear_extrude(frame_h)
            difference() {
                union() {
                    // back wall, 5 tall: room for the label with >= 0.8 mm
                    // of wall above and below the glyphs (thin-wall floor)
                    translate([-fw, -5]) square([2 * fw, 5]);
                    translate([-fw, 0]) square([2 * fw, fit_cell_len]);
                }
                translate([0, -4.1]) text(label, size = 3.2, halign = "center", spacing = 1.5);
            }
        // channel: ends 4 short of the block's +Y face (the +Y end wall)
        translate([0, 0, -0.1]) linear_extrude(deck_z0 + 0.1)
            translate([-ch, 0]) square([2 * ch, fit_cell_len - wall_t + 0.1]);
        // knob slot: knob travels y in [3, 19] (body 12 long, +-5 mm glide)
        translate([0, 0, deck_z0]) linear_extrude(frame_h - deck_z0 + 0.1)
            translate([-knob_hw - k * line_w, 3 - k * line_w])
                square([2 * (knob_hw + k * line_w), 16 + 2 * k * line_w]);
    }
    // the free slider, knob up through the slot (printed standing on the
    // body). It sits stop_clear into the channel so its rest face cannot
    // seam-weld to the label wall — the cell exists to test the SIDE and
    // ROOF clearances, and a welded slider tests nothing.
    linear_extrude(sh_h) translate([-slider_hw, stop_clear]) square([2 * slider_hw, 12]);
    linear_extrude(knob_h) translate([-knob_hw, 3 + stop_clear]) square([2 * knob_hw, 2 * knob_hw]);
}

// feeler: production flexure profile at a 90 mm span, 12 mm stroke; its own
// plateau starts at u = 2 and runs to the end of its travel
feel_span = 90;
feel_stroke = 12;
feel_fs = 1486.57 * E * (width * pow(beam_t, 3) / 12) * mid_rise / pow(feel_span, 3);
feel_apex0 = 32;                           // relaxed apex offset (at u = 2)
feel_L = pow(pow((feel_span - 2) / 2, 2) + pow(feel_apex0, 2), 0.5);   // 54.41
feel_vt = 3.32;                            // slope-matched at the flat ends
function feel_half(s) = (feel_span - s) / 2;
function feel_apex(s) = pow(max(feel_L * feel_L - pow(feel_half(s), 2), 0.01), 0.5);

module feeler() {
    ch = slider_hw + xy_tol;
    fw = ch + wall_t;
    ftip = 12 + 20;                        // head +Y face at rest (tongue 20)
    yffar = ftip + feel_span;              // 128 — far bar -Y face
    fx = [x_arch - arch_sweep_hw - sweep_clear - wall_t, 0];
    fx2 = [x_vbeam + feel_apex(feel_stroke) + feel_vt / 2 + sweep_clear,
           x_vbeam + feel_apex(feel_stroke) + feel_vt / 2 + sweep_clear + wall_t];
    difference() {
        linear_extrude(frame_h)
            union() {
                translate([-fw, y_chan0 - y_bar_t]) square([2 * fw, y_bar_t]);
                translate([-fw, y_chan0]) square([wall_t, 24 - y_chan0]);
                translate([ch, y_chan0]) square([wall_t, 24 - y_chan0]);
                translate([-ch, y_chan0]) square([2 * ch, 24 - y_chan0]);
                translate([fx[0], 24]) square([fx2[1] - fx[0], y_bar_t]);
                translate([fx[0], 24 + y_bar_t]) square([wall_t, yffar + y_far_t - 24 - y_bar_t]);
                translate([fx2[0], 24 + y_bar_t]) square([wall_t, yffar + y_far_t - 24 - y_bar_t]);
                translate([fx[0], yffar]) square([fx2[1] - fx[0], y_far_t]);
            }
        translate([0, 0, -0.1]) linear_extrude(deck_z0 + 0.1)
            translate([-ch, y_chan0]) square([2 * ch, 24 - y_chan0 + 0.1]);
        translate([0, 0, deck_z0]) linear_extrude(frame_h - deck_z0 + 0.1)
            translate([-knob_hw - xy_tol, 3 - xy_tol])
                square([2 * (knob_hw + xy_tol), feel_stroke + 2 * knob_hw + 2 * xy_tol]);
        translate([0, 0, -0.1]) linear_extrude(deck_z0 + 0.1)
            translate([-tongue_w / 2 - xy_tol, 24]) square([tongue_w + 2 * xy_tol, y_bar_t + 0.1]);
    }
    // mover at rest: body + tongue + head + knob
    linear_extrude(sh_h) union() {
        translate([-slider_hw, 0]) square([2 * slider_hw, 12]);
        translate([-tongue_w / 2, 12]) square([tongue_w, 20 - head_len]);
        translate([head_x[0], ftip - head_len]) square([head_x[1] - head_x[0], head_len]);
    }
    linear_extrude(knob_h) translate([-knob_hw, 3]) square([2 * knob_hw, 2 * knob_hw]);
    // springs: the arch modules at the shorter span + the slope-matched V
    linear_extrude(sh_h) union() {
        arch_band_2d(x_arch, ftip - ov, yffar + ov, mid_rise, beam_t);
        arch_root_gussets_2d(x_arch, ftip, yffar, beam_t);
    }
    fap = [x_vbeam + feel_apex(0), (ftip + yffar) / 2];
    linear_extrude(sh_h) union() {
        hull() { translate([x_vbeam, ftip - ov]) circle(feel_vt / 2); translate(fap) circle(feel_vt / 2); }
        hull() { translate(fap) circle(feel_vt / 2); translate([x_vbeam, yffar + ov]) circle(feel_vt / 2); }
    }
}

module coupon() {
    pitch = 2 * (slider_hw + 0.5 * line_w + wall_t) + 4;
    for (i = [0 : len(fit_kxy) - 1])
        translate([i * pitch, 0, 0]) fit_cell(fit_kxy[i], str(i + 1));
    // feeler alongside, long axis along +X (rotate -90 turns its +Y to +X)
    translate([3 * pitch + 6, 26 + 6, 0]) rotate(-90) feeler();
}

// "" = the production part (a monolith: the springs ARE the slider-frame
// connection, like bistable-toggle's fixed-fixed arch — bodies:1 is correct
// and the flex proof is the travel-sweep fitcheck + the fusecheck's
// chamber-drop). "coupon" = print this first. "fitcheck" = cage MINUS deck,
// intersected with everything that moves across stroke+snap (must be EMPTY).
// "fitcheck_neg" = that sweep grown past the clearances (must interfere —
// proves the check can fail). "fused" = every clearance turned into
// interference (the fusecheck control: must slice to 1 body).
part = "";

module main() {
    assert(mid_rise / beam_t >= 2.3,
           "arch too flat to be bistable (mid_rise/beam_t < 2.3)");
    assert(beam_t >= 0.8, "arch band under the two-perimeter floor (0.8 mm)");
    assert(width >= 3, "flexure width under the 3 mm floor");
    assert(span / mid_rise >= 10,
           "arch not shallow enough for the fixed-fixed constants (l/h < 10)");
    assert(abs(fs_pred - target_fs) < 0.05,
           str("solve drifted: echoed f_s = ", fs_pred, " N vs target ", target_fs, " N"));
    assert(u_engage + u_tr <= stroke,
           "the snap does not complete inside the stroke");
    assert(u_engage + u_tr >= (1 + flat_frac) / 2 * stroke - 0.001,
           "the snap finishes before the flat zone ends");
    assert(abs(v_k(stroke / 2) - k_arch) / k_arch <= 0.10,
           str("V-beam slope mismatch: k_v(mid-stroke) = ", v_k(stroke / 2),
               " N/mm vs |k_arch| = ", k_arch, " N/mm"));
    assert(z_layers >= 1, "the roof gap must be whole layers");
    assert(k_xy * line_w >= 0.15, "xy gap under the spread floor (0.15 mm)");
    echo(str("predicted switch force f_s = ", fs_pred, " N (target ", target_fs, " N)"));
    echo(str("predicted plateau ~ ", target_force, " N over u in [", u_engage, ", ",
             u_engage + u_tr, "] (middle ", flat_frac * 100, "% of the ", stroke, " mm stroke)"));
    echo(str("slope match: k_v(mid-stroke) = ", v_k(stroke / 2), " N/mm vs |k_arch| = ", k_arch, " N/mm"));
    echo(str("V-beam leg strain estimate ",
             1.5 * v_t * (v_apex(stroke) - v_apex(0)) / pow(v_L, 2) * 100, " % (PETG yield ~2-3%)"));
    echo(str("coupon feeler: f_s = ", feel_fs, " N, plateau ~9 N over u in [2, 12]"));

    if (part == "coupon")
        coupon();
    else if (part == "fitcheck")
        // cage = the frame as it exists below the deck — the footprint MINUS
        // the channel and tongue window (clearances, not obstacles) — met
        // with the full sweep. Must be EMPTY.
        linear_extrude(deck_z0) intersection() {
            difference() { frame_2d(false); below_deck_cuts_2d(xy_tol); }
            sweep_2d();
        }
    else if (part == "fitcheck_neg")
        linear_extrude(deck_z0) intersection() {
            difference() { frame_2d(false); below_deck_cuts_2d(xy_tol); }
            offset(0.5) sweep_2d();
        }
    else if (part == "fused") {
        difference() { linear_extrude(frame_h) frame_2d(); frame_cuts_3d(true); }
        mover(0);
        arch(0);
        vbeam(0);
    }
    else {
        frame();
        mover(demo_u);
        arch(demo_u);
        vbeam(demo_u);
    }
}

main();
